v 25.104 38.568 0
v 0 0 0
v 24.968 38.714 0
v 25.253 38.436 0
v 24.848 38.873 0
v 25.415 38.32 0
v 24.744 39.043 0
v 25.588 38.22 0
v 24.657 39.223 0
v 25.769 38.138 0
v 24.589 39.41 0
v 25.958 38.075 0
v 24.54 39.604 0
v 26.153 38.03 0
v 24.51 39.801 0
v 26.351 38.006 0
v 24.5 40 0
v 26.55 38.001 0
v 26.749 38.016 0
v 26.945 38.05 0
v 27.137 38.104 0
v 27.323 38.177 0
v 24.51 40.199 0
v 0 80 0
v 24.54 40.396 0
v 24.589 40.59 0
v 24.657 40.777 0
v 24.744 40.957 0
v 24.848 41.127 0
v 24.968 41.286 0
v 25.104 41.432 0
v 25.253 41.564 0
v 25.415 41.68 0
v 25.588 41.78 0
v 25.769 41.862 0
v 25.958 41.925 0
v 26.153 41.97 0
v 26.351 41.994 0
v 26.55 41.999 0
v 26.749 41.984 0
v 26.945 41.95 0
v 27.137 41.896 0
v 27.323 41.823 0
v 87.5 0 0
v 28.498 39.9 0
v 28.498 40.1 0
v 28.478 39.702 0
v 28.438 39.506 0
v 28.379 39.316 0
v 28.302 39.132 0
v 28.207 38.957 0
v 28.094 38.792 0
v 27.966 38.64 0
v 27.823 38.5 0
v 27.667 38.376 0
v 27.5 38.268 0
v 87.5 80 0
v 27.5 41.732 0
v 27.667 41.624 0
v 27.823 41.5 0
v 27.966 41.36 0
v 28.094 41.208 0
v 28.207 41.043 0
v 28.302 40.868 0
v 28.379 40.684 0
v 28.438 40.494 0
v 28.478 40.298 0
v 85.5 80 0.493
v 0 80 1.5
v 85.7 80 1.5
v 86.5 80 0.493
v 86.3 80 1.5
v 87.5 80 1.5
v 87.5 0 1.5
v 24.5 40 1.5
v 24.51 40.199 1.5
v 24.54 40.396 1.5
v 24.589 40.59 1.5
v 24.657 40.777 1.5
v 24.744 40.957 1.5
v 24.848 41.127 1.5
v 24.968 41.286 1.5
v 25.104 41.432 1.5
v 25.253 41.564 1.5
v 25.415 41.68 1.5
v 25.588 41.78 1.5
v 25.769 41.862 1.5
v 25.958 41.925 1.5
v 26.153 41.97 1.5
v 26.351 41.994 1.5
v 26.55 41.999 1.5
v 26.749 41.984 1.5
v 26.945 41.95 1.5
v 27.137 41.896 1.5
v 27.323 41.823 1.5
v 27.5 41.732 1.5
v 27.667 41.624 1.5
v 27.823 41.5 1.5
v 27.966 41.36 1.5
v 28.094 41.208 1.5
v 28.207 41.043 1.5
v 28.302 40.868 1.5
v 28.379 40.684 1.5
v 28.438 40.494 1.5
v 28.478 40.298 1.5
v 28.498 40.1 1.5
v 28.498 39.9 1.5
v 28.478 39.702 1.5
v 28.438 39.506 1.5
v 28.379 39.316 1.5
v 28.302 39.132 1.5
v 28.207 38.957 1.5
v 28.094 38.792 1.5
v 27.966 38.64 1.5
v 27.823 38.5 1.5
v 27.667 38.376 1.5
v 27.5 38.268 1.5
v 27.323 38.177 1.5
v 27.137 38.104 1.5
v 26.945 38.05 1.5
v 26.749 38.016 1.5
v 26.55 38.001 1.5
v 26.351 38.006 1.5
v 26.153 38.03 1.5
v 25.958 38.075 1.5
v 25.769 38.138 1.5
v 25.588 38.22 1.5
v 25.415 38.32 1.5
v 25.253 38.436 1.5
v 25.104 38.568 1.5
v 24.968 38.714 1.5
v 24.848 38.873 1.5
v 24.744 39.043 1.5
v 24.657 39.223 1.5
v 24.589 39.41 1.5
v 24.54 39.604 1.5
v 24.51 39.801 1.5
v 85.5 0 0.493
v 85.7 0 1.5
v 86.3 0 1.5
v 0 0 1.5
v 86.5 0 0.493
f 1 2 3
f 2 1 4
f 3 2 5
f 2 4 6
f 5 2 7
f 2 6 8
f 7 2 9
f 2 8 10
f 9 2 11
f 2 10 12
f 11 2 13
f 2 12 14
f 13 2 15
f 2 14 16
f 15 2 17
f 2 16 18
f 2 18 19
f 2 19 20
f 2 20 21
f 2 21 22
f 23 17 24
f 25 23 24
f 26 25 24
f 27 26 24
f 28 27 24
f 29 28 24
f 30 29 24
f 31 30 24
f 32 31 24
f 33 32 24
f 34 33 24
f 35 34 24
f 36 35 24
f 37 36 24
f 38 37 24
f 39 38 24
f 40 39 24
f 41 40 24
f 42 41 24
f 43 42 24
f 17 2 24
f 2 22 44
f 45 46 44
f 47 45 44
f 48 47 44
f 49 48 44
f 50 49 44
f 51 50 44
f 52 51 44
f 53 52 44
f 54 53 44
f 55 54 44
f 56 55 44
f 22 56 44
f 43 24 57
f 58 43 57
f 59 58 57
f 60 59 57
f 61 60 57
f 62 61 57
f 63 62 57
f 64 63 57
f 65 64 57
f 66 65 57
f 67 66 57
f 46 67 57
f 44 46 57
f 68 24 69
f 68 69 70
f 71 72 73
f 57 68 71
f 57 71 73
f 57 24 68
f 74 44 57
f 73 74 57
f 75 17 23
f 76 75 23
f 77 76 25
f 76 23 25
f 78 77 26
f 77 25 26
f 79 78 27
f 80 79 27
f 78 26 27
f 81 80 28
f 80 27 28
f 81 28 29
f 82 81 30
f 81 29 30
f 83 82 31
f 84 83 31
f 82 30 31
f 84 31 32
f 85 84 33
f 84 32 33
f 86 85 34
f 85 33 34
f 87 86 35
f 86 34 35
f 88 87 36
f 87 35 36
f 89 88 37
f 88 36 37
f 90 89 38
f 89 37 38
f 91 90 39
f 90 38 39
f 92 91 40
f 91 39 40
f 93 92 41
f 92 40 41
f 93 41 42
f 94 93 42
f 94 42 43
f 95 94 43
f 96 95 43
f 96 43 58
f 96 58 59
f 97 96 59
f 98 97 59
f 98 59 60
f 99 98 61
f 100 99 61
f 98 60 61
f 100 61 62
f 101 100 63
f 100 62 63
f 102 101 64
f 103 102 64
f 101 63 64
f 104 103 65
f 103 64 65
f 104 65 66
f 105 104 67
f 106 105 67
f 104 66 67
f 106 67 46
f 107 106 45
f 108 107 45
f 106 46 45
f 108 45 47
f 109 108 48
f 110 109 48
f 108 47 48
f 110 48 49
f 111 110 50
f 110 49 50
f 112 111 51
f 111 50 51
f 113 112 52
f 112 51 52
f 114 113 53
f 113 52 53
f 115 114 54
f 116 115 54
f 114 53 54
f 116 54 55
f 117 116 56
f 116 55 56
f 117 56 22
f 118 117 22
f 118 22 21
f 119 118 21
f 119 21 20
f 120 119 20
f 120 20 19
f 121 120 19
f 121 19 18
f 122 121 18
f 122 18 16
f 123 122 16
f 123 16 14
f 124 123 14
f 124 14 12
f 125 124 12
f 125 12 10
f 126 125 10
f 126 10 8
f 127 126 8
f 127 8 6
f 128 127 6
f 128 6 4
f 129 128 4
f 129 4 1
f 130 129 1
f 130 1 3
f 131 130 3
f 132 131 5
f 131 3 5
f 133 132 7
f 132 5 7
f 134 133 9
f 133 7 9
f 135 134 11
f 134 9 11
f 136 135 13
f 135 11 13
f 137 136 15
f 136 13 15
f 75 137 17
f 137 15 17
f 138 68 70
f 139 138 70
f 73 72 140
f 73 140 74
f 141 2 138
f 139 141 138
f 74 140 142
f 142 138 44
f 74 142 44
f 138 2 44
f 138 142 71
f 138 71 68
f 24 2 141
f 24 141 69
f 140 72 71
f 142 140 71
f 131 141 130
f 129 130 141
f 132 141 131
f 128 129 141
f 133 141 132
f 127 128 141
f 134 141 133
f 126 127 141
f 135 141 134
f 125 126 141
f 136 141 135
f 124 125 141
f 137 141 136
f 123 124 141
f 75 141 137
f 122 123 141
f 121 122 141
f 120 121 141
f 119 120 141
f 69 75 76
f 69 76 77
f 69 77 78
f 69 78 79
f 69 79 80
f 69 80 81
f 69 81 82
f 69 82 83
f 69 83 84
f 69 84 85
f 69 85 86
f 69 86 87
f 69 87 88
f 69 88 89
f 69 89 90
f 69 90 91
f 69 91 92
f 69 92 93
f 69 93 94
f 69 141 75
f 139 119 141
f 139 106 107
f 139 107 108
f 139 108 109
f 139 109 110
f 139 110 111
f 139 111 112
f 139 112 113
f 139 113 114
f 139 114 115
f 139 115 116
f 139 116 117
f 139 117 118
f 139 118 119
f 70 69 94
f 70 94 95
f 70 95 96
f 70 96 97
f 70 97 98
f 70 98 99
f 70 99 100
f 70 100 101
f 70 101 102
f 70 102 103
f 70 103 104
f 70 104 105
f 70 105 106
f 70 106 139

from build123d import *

# Parameters (mm, degrees)
SKETCH1_W           = 87.5
SKETCH1_H           = 80
BOSS_EXTRUDE1_DEPTH = 1.5
CUT_EXTRUDE1_DEPTH  = 80
SKETCH3_R           = 2
CUT_EXTRUDE2_DEPTH  = 1.5


with BuildPart() as part:
    # Sketch1 → Boss-Extrude1 (new body)
    with BuildSketch(Plane.XY):
        with Locations((43.75, 40)):
            Rectangle(SKETCH1_W, SKETCH1_H)
    extrude(amount=BOSS_EXTRUDE1_DEPTH)

    # Sketch2 → Cut-Extrude1 (cut)
    with BuildSketch(Plane(origin=(0, 80, 0), x_dir=(1, 0, 0), z_dir=(0, 1, 0))):
        Polygon((86.5, -0.492887182), (85.5, -0.492887182), (85.7, -1.5), (86.3, -1.5), align=None)
    extrude(amount=-CUT_EXTRUDE1_DEPTH, mode=Mode.SUBTRACT)

    # Sketch3 → Cut-Extrude2 (cut)
    with BuildSketch(Plane(origin=(0, 0, 0), x_dir=(-1, 0, 0), z_dir=(0, 0, -1))):
        with Locations((-26.5, 40)):
            Circle(SKETCH3_R)
    extrude(amount=-CUT_EXTRUDE2_DEPTH, mode=Mode.SUBTRACT)


solid = part.part
